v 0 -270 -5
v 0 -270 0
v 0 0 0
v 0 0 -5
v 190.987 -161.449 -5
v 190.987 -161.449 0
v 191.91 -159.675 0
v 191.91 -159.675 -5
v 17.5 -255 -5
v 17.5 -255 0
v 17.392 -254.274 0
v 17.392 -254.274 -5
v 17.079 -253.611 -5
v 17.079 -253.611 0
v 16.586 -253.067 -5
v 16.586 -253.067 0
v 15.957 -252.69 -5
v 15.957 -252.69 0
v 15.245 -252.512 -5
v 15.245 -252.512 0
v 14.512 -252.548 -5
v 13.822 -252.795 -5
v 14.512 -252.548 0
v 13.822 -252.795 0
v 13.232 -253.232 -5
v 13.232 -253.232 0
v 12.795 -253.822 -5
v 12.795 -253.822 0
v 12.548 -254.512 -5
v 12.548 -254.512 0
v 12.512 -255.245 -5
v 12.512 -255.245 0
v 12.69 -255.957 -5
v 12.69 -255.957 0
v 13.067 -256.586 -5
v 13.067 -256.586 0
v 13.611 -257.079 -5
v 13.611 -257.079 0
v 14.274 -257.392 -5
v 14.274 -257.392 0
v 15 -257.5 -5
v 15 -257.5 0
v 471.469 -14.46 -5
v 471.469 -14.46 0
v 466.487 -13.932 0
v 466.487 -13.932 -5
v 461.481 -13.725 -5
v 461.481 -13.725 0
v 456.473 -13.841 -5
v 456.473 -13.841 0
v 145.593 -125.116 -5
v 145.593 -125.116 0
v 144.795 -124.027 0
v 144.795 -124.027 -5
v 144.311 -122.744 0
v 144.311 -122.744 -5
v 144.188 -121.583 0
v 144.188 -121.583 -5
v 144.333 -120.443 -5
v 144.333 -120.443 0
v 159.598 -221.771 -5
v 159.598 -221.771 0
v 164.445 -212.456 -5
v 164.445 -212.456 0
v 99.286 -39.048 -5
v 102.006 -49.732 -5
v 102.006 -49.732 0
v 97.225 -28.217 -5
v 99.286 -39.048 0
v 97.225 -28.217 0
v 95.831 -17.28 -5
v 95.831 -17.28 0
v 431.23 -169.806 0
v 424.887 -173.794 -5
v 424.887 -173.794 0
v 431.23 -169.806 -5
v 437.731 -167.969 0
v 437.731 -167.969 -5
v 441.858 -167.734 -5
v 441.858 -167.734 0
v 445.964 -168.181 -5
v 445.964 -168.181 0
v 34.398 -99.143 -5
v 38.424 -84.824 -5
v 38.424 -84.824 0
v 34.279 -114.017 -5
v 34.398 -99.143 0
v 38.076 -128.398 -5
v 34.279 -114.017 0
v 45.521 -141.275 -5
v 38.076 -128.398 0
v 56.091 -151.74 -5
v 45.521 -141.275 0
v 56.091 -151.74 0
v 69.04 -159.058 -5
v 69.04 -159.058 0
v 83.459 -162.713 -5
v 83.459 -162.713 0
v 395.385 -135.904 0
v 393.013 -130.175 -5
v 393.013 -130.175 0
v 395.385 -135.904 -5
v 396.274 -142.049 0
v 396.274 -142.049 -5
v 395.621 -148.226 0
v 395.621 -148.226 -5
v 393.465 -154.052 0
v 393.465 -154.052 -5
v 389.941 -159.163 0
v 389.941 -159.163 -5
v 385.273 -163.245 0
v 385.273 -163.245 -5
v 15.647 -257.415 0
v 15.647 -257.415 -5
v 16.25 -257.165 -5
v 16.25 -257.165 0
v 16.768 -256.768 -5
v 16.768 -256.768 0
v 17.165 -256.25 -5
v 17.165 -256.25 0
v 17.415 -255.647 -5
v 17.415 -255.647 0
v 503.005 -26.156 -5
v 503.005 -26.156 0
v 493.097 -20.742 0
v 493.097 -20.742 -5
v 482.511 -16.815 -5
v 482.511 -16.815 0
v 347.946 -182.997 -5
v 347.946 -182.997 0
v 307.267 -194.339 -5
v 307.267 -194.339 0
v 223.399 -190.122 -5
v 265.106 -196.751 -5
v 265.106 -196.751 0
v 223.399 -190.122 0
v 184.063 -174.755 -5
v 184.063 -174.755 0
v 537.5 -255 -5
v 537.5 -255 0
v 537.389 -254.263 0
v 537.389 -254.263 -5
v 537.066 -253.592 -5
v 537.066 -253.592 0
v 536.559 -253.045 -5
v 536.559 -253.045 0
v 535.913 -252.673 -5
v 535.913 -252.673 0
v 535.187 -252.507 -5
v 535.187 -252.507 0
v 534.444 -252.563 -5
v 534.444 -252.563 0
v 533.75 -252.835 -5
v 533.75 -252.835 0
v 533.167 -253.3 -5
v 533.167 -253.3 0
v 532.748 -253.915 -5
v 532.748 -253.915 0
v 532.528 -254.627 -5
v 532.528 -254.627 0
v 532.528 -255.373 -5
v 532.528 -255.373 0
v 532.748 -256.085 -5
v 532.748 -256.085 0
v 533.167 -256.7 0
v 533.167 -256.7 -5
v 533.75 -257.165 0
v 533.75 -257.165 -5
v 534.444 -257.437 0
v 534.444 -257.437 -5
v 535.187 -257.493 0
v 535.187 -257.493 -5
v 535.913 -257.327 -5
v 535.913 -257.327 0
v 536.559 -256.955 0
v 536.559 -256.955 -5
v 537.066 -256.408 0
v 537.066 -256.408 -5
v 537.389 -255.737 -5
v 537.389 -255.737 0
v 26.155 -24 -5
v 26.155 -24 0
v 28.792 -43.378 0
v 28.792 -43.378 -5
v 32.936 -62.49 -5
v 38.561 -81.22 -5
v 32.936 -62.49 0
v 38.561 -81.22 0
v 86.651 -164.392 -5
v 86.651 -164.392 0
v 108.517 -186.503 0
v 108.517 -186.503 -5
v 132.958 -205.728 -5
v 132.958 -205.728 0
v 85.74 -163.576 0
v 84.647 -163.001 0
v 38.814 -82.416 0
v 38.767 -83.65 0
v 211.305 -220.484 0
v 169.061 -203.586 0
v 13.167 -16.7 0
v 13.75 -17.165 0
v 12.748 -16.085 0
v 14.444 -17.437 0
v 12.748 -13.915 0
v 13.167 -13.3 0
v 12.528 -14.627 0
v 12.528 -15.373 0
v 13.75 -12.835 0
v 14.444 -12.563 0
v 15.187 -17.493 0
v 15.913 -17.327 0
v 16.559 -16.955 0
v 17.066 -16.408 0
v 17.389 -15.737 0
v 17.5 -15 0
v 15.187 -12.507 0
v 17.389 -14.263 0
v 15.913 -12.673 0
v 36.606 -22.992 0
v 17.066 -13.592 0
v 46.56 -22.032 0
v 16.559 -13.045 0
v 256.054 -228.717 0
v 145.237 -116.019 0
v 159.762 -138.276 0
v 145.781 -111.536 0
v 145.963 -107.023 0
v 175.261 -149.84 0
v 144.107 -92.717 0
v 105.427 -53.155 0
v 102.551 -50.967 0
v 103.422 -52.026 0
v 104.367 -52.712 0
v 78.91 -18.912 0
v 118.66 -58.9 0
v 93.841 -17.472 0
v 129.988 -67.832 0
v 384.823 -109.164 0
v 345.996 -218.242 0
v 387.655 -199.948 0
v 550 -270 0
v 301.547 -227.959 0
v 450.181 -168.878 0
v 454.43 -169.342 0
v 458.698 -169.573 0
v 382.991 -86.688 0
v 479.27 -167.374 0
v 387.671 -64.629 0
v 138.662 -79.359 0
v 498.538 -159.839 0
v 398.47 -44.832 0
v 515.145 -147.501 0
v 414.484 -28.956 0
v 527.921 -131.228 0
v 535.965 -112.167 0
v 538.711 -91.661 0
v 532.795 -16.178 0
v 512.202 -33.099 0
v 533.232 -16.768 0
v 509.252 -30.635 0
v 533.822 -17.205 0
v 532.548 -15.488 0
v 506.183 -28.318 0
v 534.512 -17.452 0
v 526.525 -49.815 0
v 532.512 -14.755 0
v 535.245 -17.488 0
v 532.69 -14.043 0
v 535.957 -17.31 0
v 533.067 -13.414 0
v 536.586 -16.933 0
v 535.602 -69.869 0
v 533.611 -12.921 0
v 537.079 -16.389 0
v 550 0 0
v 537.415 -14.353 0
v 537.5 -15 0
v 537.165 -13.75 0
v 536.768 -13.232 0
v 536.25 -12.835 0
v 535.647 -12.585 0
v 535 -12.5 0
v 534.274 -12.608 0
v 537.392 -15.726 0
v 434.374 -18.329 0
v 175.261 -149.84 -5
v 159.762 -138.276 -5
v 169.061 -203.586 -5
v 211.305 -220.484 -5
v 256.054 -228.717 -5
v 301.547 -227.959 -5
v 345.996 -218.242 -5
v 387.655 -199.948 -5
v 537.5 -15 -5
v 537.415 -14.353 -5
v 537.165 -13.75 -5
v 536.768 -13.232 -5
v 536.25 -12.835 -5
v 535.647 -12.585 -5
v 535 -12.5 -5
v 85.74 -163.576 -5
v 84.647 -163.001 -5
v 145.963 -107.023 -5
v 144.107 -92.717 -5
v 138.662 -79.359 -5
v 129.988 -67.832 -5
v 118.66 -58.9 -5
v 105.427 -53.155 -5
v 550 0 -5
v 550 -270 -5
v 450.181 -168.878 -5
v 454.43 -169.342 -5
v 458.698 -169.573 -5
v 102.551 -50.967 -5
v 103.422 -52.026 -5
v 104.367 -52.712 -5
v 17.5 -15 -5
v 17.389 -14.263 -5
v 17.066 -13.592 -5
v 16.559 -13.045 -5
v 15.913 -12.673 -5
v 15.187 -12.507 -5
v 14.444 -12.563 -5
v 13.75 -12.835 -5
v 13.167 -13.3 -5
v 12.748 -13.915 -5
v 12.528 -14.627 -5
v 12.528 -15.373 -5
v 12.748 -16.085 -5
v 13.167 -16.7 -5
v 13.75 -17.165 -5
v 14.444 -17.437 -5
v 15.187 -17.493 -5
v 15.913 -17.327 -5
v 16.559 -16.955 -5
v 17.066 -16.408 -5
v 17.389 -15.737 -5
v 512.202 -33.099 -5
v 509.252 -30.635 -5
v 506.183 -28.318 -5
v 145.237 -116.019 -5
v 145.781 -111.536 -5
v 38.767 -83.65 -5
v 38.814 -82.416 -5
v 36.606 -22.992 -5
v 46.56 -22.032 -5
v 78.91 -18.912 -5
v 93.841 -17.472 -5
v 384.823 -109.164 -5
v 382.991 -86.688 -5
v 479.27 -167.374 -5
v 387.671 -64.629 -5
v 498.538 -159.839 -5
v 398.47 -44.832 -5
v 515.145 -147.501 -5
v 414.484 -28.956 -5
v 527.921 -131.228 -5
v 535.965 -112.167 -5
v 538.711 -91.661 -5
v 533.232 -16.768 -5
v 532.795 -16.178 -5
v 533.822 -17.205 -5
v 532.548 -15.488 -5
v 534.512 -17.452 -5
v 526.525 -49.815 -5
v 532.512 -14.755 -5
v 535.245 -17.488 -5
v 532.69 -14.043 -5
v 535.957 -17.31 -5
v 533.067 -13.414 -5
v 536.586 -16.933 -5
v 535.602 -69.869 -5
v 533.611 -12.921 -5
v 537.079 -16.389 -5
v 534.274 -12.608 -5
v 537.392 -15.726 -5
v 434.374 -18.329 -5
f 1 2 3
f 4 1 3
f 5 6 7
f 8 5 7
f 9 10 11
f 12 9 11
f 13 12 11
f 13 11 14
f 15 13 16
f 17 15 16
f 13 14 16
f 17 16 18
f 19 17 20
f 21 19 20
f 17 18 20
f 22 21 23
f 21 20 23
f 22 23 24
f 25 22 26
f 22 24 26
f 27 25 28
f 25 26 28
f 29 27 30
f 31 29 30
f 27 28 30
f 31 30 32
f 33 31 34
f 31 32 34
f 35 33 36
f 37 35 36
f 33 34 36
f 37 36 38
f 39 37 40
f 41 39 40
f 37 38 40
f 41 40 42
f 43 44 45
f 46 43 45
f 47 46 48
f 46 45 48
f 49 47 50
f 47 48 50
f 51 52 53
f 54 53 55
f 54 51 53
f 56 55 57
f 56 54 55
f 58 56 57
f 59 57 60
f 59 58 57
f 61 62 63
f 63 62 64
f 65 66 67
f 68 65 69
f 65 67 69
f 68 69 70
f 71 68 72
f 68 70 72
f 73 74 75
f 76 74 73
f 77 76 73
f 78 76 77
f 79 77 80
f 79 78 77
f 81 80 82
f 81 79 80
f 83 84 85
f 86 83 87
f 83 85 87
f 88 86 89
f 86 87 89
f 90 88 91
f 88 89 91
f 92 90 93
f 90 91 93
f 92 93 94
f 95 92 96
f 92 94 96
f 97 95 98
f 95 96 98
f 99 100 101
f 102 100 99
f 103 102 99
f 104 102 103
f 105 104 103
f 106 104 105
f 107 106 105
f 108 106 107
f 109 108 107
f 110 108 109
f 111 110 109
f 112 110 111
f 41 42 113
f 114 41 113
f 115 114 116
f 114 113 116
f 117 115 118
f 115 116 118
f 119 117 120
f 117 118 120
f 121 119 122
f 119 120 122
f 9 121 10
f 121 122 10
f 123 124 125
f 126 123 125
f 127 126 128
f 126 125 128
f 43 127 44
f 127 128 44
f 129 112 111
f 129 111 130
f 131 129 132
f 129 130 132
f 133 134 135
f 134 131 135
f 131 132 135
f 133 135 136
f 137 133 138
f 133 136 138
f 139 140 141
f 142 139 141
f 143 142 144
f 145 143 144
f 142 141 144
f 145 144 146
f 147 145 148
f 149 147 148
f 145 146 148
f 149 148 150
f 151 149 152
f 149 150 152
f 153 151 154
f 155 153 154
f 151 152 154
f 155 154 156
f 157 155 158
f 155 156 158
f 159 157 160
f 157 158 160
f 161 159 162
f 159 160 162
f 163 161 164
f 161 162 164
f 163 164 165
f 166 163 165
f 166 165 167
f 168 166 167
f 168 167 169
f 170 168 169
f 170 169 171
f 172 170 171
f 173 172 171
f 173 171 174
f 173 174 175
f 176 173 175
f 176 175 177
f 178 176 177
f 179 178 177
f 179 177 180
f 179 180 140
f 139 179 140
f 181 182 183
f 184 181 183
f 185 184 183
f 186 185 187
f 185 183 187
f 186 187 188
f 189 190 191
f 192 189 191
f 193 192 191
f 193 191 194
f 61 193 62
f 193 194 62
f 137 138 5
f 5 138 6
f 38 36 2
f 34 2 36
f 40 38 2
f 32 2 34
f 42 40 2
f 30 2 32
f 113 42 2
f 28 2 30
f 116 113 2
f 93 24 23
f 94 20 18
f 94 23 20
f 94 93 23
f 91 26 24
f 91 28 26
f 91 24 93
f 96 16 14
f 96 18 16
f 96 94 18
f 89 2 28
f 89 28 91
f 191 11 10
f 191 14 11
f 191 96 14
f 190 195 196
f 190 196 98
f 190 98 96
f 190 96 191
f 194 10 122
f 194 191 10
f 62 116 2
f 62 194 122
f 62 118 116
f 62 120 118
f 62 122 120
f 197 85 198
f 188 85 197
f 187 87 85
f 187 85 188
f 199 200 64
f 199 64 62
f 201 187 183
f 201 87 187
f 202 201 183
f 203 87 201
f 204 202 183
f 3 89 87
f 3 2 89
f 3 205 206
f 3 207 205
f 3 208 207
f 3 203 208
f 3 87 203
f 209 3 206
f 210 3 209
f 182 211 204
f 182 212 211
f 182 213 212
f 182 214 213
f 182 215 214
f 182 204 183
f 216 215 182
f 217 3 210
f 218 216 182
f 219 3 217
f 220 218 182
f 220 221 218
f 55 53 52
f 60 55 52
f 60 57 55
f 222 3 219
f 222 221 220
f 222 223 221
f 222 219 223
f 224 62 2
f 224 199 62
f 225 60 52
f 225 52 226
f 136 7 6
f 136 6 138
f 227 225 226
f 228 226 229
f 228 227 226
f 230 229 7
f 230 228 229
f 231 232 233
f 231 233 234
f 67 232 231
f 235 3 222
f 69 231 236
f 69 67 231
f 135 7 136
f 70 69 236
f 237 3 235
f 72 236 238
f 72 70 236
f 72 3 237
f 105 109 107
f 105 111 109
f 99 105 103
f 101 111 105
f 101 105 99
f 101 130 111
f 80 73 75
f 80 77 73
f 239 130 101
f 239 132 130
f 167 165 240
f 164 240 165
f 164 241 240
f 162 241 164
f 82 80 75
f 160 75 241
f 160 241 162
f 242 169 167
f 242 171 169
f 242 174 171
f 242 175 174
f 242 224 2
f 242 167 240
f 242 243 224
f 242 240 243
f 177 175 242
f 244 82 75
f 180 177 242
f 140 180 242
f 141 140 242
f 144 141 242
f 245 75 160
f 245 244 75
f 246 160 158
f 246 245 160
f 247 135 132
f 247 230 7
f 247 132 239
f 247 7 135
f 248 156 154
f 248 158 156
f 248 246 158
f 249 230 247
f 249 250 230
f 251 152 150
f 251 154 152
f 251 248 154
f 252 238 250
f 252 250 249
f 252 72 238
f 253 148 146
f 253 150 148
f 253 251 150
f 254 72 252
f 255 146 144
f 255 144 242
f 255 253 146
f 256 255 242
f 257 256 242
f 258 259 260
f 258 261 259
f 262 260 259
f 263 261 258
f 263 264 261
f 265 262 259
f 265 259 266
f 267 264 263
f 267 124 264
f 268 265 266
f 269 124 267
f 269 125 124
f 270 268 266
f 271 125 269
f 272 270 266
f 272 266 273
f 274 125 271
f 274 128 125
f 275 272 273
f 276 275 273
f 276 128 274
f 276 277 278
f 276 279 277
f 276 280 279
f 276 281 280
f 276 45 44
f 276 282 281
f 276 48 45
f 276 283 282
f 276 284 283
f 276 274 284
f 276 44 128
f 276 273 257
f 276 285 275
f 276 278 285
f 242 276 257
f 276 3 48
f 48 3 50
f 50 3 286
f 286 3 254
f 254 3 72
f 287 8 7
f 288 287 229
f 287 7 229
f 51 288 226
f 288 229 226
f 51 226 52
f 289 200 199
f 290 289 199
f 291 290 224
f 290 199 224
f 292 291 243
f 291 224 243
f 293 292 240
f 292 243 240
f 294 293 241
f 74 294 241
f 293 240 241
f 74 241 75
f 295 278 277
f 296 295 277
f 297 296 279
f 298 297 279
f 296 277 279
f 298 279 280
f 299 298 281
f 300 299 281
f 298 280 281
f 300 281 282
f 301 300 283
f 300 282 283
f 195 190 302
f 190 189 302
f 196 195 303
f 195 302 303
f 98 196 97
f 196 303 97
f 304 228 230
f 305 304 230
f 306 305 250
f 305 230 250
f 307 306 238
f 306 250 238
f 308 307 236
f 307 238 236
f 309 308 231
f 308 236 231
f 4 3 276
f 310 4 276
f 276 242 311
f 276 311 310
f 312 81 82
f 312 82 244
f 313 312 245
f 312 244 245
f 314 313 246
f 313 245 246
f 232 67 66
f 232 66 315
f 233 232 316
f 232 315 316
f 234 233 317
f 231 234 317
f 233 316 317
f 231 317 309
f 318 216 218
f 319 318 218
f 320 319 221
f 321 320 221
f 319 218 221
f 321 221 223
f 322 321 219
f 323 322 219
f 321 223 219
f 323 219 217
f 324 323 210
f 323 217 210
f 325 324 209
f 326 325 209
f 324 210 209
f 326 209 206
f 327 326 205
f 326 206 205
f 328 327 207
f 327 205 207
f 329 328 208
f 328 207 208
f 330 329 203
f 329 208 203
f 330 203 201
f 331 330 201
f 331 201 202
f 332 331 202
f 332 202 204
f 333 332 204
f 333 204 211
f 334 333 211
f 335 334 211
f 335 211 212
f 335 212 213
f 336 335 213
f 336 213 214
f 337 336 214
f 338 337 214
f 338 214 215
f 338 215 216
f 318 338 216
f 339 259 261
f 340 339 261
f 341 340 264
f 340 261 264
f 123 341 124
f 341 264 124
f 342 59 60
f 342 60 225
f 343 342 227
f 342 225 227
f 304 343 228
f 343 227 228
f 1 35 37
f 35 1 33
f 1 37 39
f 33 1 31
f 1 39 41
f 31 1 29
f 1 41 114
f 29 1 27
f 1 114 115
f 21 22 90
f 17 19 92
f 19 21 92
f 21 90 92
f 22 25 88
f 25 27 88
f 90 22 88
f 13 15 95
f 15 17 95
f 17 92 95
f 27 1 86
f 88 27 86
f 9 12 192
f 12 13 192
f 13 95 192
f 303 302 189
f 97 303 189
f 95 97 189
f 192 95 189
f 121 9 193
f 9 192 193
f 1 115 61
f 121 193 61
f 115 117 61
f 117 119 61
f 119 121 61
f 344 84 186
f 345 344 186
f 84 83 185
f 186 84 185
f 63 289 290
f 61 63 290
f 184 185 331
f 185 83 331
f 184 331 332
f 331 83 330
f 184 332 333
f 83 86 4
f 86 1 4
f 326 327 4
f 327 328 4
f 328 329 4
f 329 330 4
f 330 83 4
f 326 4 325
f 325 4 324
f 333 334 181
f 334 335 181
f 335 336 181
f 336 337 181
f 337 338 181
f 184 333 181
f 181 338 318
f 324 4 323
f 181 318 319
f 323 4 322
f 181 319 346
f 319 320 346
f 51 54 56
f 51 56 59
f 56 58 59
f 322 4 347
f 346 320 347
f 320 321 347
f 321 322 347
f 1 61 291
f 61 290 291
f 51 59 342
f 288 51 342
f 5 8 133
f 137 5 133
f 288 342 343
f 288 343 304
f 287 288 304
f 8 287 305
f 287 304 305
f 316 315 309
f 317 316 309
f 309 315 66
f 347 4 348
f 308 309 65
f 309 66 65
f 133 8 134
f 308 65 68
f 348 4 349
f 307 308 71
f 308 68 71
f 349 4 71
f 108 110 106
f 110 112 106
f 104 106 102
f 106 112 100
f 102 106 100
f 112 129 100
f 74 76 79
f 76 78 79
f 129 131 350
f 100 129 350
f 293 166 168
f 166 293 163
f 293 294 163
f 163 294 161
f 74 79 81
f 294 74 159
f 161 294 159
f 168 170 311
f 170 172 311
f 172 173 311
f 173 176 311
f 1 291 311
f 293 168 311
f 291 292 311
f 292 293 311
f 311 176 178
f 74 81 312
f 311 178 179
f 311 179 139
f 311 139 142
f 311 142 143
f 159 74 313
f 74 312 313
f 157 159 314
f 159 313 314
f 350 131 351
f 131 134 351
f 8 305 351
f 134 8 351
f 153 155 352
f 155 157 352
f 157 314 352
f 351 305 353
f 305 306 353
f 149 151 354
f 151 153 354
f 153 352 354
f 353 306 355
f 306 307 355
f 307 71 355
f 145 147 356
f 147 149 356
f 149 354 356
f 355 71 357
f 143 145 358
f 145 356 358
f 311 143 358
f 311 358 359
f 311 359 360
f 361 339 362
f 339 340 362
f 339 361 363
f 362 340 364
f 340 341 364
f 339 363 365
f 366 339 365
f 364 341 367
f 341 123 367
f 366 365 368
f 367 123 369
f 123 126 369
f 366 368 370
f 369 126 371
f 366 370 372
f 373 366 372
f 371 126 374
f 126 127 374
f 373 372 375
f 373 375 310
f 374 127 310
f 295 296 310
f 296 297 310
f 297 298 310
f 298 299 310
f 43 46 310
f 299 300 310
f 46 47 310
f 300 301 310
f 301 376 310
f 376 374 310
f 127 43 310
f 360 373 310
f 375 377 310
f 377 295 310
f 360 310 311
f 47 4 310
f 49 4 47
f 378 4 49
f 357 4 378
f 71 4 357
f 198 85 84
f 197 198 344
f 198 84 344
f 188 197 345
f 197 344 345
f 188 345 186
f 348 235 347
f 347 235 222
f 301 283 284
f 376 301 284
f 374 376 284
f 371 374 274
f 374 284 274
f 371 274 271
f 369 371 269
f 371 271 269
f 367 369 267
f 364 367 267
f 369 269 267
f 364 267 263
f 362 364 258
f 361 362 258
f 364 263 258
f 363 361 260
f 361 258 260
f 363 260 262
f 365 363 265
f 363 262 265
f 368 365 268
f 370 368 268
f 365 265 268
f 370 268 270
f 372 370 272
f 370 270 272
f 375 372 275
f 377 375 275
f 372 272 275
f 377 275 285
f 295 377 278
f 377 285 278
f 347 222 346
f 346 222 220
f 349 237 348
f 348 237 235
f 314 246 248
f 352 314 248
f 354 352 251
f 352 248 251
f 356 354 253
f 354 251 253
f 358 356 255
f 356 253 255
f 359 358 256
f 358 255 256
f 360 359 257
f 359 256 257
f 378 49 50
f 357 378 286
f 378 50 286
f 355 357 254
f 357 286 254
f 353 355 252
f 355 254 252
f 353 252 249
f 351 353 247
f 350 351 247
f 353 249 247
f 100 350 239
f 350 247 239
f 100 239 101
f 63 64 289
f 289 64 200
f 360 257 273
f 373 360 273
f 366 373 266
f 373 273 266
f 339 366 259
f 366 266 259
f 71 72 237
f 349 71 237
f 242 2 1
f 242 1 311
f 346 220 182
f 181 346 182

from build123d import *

# Parameters (mm, degrees)
F0_W     = 550
F0_H     = 270
F1_DEPTH = 5
F3_DEPTH = 25
F4_R     = 25
F2_R     = 2.5
F5_DEPTH = 25
F6_R     = 5


with BuildPart() as f1:
    # F0 (on Top) → F1 (new body)
    with BuildSketch(Plane.XY):
        with Locations((275, -135)):
            Rectangle(F0_W, F0_H)
    extrude(amount=-F1_DEPTH)

    # F2 (on face) → F3 (cut)
    with BuildSketch(Plane.XY):
        with BuildLine():
            ThreePointArc((445.5878496959, -168.1072144083), (452.1119253863, -169.1179747106), (458.6981361528, -169.5729777234))
            ThreePointArc((458.6981361528, -169.5729777234), (515.1450884683, -147.5010120731), (538.711061865, -91.6612861494))
            ThreePointArc((538.711061865, -91.6612861494), (531.7751165183, -59.5200686387), (512.2017629268, -33.0994511193))
            ThreePointArc((512.2017629268, -33.0994511193), (489.778644371, -105.9735057557), (445.5878496959, -168.1072144083))
        make_face()
        with BuildLine():
            ThreePointArc((434.4818086721, -165.032732216), (439.9779290015, -166.7755154888), (445.5878496959, -168.1072144083))
            ThreePointArc((445.5878496959, -168.1072144083), (489.778644371, -105.9735057557), (512.2017629268, -33.0994511193))
            ThreePointArc((512.2017629268, -33.0994511193), (507.7316897495, -29.4576002162), (503.004614878, -26.1561769822))
            ThreePointArc((503.004614878, -26.1561769822), (480.8108512866, -101.5487247221), (434.4818086721, -165.032732216))
        make_face()
        with BuildLine():
            ThreePointArc((406.011915497, -147.1219833941), (419.2691571527, -157.6314611673), (434.4818086721, -165.032732216))
            ThreePointArc((434.4818086721, -165.032732216), (480.8108512866, -101.5487247221), (503.004614878, -26.1561769822))
            ThreePointArc((503.004614878, -26.1561769822), (487.87511248, -18.5863859301), (471.4686275556, -14.459543092))
            ThreePointArc((471.4686275556, -14.459543092), (451.6655237624, -87.1681863628), (406.011915497, -147.1219833941))
        make_face()
        with BuildLine():
            ThreePointArc((396.3969974723, -135.5978207964), (400.9264158373, -141.5918788666), (406.011915497, -147.1219833941))
            ThreePointArc((406.011915497, -147.1219833941), (451.6655237624, -87.1681863628), (471.4686275556, -14.459543092))
            ThreePointArc((471.4686275556, -14.459543092), (463.9857274878, -13.7882983897), (456.4729635167, -13.8406471114))
            ThreePointArc((456.4729635167, -13.8406471114), (438.2138341358, -80.5310148123), (396.3969974723, -135.5978207964))
        make_face()
        with BuildLine():
            ThreePointArc((395.2793152892, -133.9137271289), (395.8326968589, -134.7593972826), (396.3969974723, -135.5978207964))
            ThreePointArc((396.3969974723, -135.5978207964), (438.2138341358, -80.5310148123), (456.4729635167, -13.8406471114))
            ThreePointArc((456.4729635167, -13.8406471114), (391.3304963156, -56.2714595868), (395.2793152892, -133.9137271289))
        make_face()
        with BuildLine():
            ThreePointArc((26.1547087534, -24.0004380043), (30.8880481953, -53.9384370008), (39.2095922874, -83.0835942334))
            ThreePointArc((39.2095922874, -83.0835942334), (42.4819606163, -77.1205988593), (46.4524007703, -71.5977994519))
            ThreePointArc((46.4524007703, -71.5977994519), (40.2678425285, -47.5506492992), (36.6062109858, -22.9924196081))
            Line((36.6062109858, -22.9924196081), (26.1547087534, -24.0004380043))
        make_face()
        with BuildLine():
            ThreePointArc((36.6062109858, -22.9924196081), (40.2678425285, -47.5506492992), (46.4524007703, -71.5977994519))
            ThreePointArc((46.4524007703, -71.5977994519), (50.2625511055, -67.3805241048), (54.4801240278, -63.5707031676))
            ThreePointArc((54.4801240278, -63.5707031676), (49.5613274278, -42.9843565598), (46.5600226356, -22.0324020879))
            Line((46.5600226356, -22.0324020879), (36.6062109858, -22.9924196081))
        make_face()
        with BuildLine():
            ThreePointArc((46.5600226356, -22.0324020879), (49.5613274278, -42.9843565598), (54.4801240278, -63.5707031676))
            ThreePointArc((54.4801240278, -63.5707031676), (68.7018719367, -55.1253458568), (84.76908962, -51.1976633843))
            ThreePointArc((84.76908962, -51.1976633843), (81.1661428415, -35.1772059589), (78.9099104977, -18.9123451474))
            Line((78.9099104977, -18.9123451474), (46.5600226356, -22.0324020879))
        make_face()
        with BuildLine():
            ThreePointArc((78.9099104977, -18.9123451474), (81.1661428415, -35.1772059589), (84.76908962, -51.1976633843))
            ThreePointArc((84.76908962, -51.1976633843), (92.7043581114, -51.0322504264), (100.5834584289, -51.9891337337))
            ThreePointArc((100.5834584289, -51.9891337337), (96.3763447636, -34.89397928), (93.8406279725, -17.4723188671))
            Line((93.8406279725, -17.4723188671), (78.9099104977, -18.9123451474))
        make_face()
        with BuildLine():
            ThreePointArc((93.8406279725, -17.4723188671), (96.3763447636, -34.89397928), (100.5834584289, -51.9891337337))
            ThreePointArc((100.5834584289, -51.9891337337), (101.702824577, -52.2182469254), (102.8172889589, -52.4701250099))
            ThreePointArc((102.8172889589, -52.4701250099), (98.4454239564, -35.0497029669), (95.8313903025, -17.2803153631))
            Line((95.8313903025, -17.2803153631), (93.8406279725, -17.4723188671))
        make_face()
        with BuildLine():
            ThreePointArc((102.8172889589, -52.4701250099), (119.1726628165, -90.0990620723), (143.6244940218, -123.0466433063))
            ThreePointArc((143.6244940218, -123.0466433063), (145.375436454, -115.11981647), (145.9631920321, -107.023216784))
            ThreePointArc((145.9631920321, -107.023216784), (133.8730301026, -72.2467564476), (102.8172889589, -52.4701250099))
        make_face()
        with BuildLine():
            ThreePointArc((100.5834584289, -51.9891337337), (117.4412479589, -91.100162762), (142.9268949098, -125.2225814773))
            ThreePointArc((142.9268949098, -125.2225814773), (143.2867819227, -124.1381669965), (143.6244940218, -123.0466433063))
            ThreePointArc((143.6244940218, -123.0466433063), (119.1726628165, -90.0990620723), (102.8172889589, -52.4701250099))
            ThreePointArc((102.8172889589, -52.4701250099), (101.702824577, -52.2182469254), (100.5834584289, -51.9891337337))
        make_face()
        with BuildLine():
            ThreePointArc((84.76908962, -51.1976633843), (104.455636527, -98.6084179347), (135.7230627314, -139.3231306894))
            ThreePointArc((135.7230627314, -139.3231306894), (139.8253147464, -132.5284727964), (142.9268949098, -125.2225814773))
            ThreePointArc((142.9268949098, -125.2225814773), (117.4412479589, -91.100162762), (100.5834584289, -51.9891337337))
            ThreePointArc((100.5834584289, -51.9891337337), (92.7043581114, -51.0322504264), (84.76908962, -51.1976633843))
        make_face()
        with BuildLine():
            ThreePointArc((54.4801240278, -63.5707031676), (76.3201450911, -114.8763041421), (109.8887146149, -159.4004812994))
            ThreePointArc((109.8887146149, -159.4004812994), (124.3031821577, -151.2884347545), (135.7230627314, -139.3231306894))
            ThreePointArc((135.7230627314, -139.3231306894), (104.455636527, -98.6084179347), (84.76908962, -51.1976633843))
            ThreePointArc((84.76908962, -51.1976633843), (68.7018719367, -55.1253458568), (54.4801240278, -63.5707031676))
        make_face()
        with BuildLine():
            ThreePointArc((46.4524007703, -71.5977994519), (67.6630708031, -119.8818075906), (98.9269281749, -162.353082441))
            ThreePointArc((98.9269281749, -162.353082441), (104.4827523758, -161.1549696004), (109.8887146149, -159.4004812994))
            ThreePointArc((109.8887146149, -159.4004812994), (76.3201450911, -114.8763041421), (54.4801240278, -63.5707031676))
            ThreePointArc((54.4801240278, -63.5707031676), (50.2625511055, -67.3805241048), (46.4524007703, -71.5977994519))
        make_face()
        with BuildLine():
            ThreePointArc((39.2095922874, -83.0835942334), (58.5731428007, -125.1375862115), (85.359218008, -162.8998889056))
            ThreePointArc((85.359218008, -162.8998889056), (92.159689712, -163.0387878421), (98.9269281749, -162.353082441))
            ThreePointArc((98.9269281749, -162.353082441), (67.6630708031, -119.8818075906), (46.4524007703, -71.5977994519))
            ThreePointArc((46.4524007703, -71.5977994519), (42.4819606163, -77.1205988593), (39.2095922874, -83.0835942334))
        make_face()
        with BuildLine():
            ThreePointArc((39.2095922874, -83.0835942334), (41.3696850637, -135.0845918815), (85.359218008, -162.8998889056))
            ThreePointArc((85.359218008, -162.8998889056), (58.5731428007, -125.1375862115), (39.2095922874, -83.0835942334))
        make_face()
        with BuildLine():
            ThreePointArc((142.9268949098, -125.2225814773), (165.4491613095, -145.3362093293), (190.9870540226, -161.4491403142))
            Line((190.9870540226, -161.4491403142), (191.9102732092, -159.6749739371))
            ThreePointArc((191.9102732092, -159.6749739371), (166.2146946142, -143.4076613439), (143.6244940218, -123.0466433063))
            ThreePointArc((143.6244940218, -123.0466433063), (143.2867819227, -124.1381669965), (142.9268949098, -125.2225814773))
        make_face()
        with BuildLine():
            ThreePointArc((135.7230627314, -139.3231306894), (158.5376207067, -158.8883702772), (184.0629101234, -174.7553881423))
            Line((184.0629101234, -174.7553881423), (190.9870540226, -161.4491403142))
            ThreePointArc((190.9870540226, -161.4491403142), (165.4491613095, -145.3362093293), (142.9268949098, -125.2225814773))
            ThreePointArc((142.9268949098, -125.2225814773), (139.8253147464, -132.5284727964), (135.7230627314, -139.3231306894))
        make_face()
        with BuildLine():
            ThreePointArc((109.8887146149, -159.4004812994), (137.6857628157, -183.8886898819), (169.0605983417, -203.5855917699))
            Line((169.0605983417, -203.5855917699), (184.0629101234, -174.7553881423))
            ThreePointArc((184.0629101234, -174.7553881423), (158.5376207067, -158.8883702772), (135.7230627314, -139.3231306894))
            ThreePointArc((135.7230627314, -139.3231306894), (124.3031821577, -151.2884347545), (109.8887146149, -159.4004812994))
        make_face()
        with BuildLine():
            ThreePointArc((98.9269281749, -162.353082441), (129.5126452175, -190.2463655327), (164.4445024089, -212.4564236553))
            Line((164.4445024089, -212.4564236553), (169.0605983417, -203.5855917699))
            ThreePointArc((169.0605983417, -203.5855917699), (137.6857628157, -183.8886898819), (109.8887146149, -159.4004812994))
            ThreePointArc((109.8887146149, -159.4004812994), (104.4827523758, -161.1549696004), (98.9269281749, -162.353082441))
        make_face()
        with BuildLine():
            ThreePointArc((85.359218008, -162.8998889056), (119.6639725539, -195.884452107), (159.5976016794, -221.7707971349))
            Line((159.5976016794, -221.7707971349), (164.4445024089, -212.4564236553))
            ThreePointArc((164.4445024089, -212.4564236553), (129.5126452175, -190.2463655327), (98.9269281749, -162.353082441))
            ThreePointArc((98.9269281749, -162.353082441), (92.159689712, -163.0387878421), (85.359218008, -162.8998889056))
        make_face()
        with BuildLine():
            Line((184.0629101234, -174.7553881423), (169.0605983417, -203.5855917699))
            ThreePointArc((169.0605983417, -203.5855917699), (307.9890600374, -227.1166482622), (434.4818086721, -165.032732216))
            ThreePointArc((434.4818086721, -165.032732216), (419.2691571527, -157.6314611673), (406.011915497, -147.1219833941))
            ThreePointArc((406.011915497, -147.1219833941), (299.3392517679, -195.4906668447), (184.0629101234, -174.7553881423))
        make_face()
    extrude(amount=-F3_DEPTH, mode=Mode.SUBTRACT)

    # F4
    f4_edges = [f1.edges().sort_by_distance(p)[0] for p in [
        (406.011915, -147.121983, -2.5),
        (434.481809, -165.032732, -2.5),
    ]]
    fillet(f4_edges, radius=F4_R)

    # F2 (on face) → F5 (cut)
    with BuildSketch(Plane.XY):
        with Locations((15, -15)):
            Circle(F2_R)
        with BuildLine():
            ThreePointArc((17.5, -255), (13.232233047, -253.232233047), (15, -257.5))
            ThreePointArc((15, -257.5), (16.767766953, -256.767766953), (17.5, -255))
        make_face()
        with Locations((535, -255)):
            Circle(F2_R)
        with BuildLine():
            ThreePointArc((537.5, -15), (536.767766953, -13.232233047), (535, -12.5))
            ThreePointArc((535, -12.5), (533.232233047, -16.767766953), (537.5, -15))
        make_face()
    extrude(amount=-F5_DEPTH, mode=Mode.SUBTRACT)

    # F6
    f6_edges = [f1.edges().sort_by_distance(p)[0] for p in [
        (102.817289, -52.470125, -2.5),
        (143.624494, -123.046643, -2.5),
        (39.209592, -83.083594, -2.5),
        (85.359218, -162.899889, -2.5),
    ]]
    fillet(f6_edges, radius=F6_R)


solid = f1.part
